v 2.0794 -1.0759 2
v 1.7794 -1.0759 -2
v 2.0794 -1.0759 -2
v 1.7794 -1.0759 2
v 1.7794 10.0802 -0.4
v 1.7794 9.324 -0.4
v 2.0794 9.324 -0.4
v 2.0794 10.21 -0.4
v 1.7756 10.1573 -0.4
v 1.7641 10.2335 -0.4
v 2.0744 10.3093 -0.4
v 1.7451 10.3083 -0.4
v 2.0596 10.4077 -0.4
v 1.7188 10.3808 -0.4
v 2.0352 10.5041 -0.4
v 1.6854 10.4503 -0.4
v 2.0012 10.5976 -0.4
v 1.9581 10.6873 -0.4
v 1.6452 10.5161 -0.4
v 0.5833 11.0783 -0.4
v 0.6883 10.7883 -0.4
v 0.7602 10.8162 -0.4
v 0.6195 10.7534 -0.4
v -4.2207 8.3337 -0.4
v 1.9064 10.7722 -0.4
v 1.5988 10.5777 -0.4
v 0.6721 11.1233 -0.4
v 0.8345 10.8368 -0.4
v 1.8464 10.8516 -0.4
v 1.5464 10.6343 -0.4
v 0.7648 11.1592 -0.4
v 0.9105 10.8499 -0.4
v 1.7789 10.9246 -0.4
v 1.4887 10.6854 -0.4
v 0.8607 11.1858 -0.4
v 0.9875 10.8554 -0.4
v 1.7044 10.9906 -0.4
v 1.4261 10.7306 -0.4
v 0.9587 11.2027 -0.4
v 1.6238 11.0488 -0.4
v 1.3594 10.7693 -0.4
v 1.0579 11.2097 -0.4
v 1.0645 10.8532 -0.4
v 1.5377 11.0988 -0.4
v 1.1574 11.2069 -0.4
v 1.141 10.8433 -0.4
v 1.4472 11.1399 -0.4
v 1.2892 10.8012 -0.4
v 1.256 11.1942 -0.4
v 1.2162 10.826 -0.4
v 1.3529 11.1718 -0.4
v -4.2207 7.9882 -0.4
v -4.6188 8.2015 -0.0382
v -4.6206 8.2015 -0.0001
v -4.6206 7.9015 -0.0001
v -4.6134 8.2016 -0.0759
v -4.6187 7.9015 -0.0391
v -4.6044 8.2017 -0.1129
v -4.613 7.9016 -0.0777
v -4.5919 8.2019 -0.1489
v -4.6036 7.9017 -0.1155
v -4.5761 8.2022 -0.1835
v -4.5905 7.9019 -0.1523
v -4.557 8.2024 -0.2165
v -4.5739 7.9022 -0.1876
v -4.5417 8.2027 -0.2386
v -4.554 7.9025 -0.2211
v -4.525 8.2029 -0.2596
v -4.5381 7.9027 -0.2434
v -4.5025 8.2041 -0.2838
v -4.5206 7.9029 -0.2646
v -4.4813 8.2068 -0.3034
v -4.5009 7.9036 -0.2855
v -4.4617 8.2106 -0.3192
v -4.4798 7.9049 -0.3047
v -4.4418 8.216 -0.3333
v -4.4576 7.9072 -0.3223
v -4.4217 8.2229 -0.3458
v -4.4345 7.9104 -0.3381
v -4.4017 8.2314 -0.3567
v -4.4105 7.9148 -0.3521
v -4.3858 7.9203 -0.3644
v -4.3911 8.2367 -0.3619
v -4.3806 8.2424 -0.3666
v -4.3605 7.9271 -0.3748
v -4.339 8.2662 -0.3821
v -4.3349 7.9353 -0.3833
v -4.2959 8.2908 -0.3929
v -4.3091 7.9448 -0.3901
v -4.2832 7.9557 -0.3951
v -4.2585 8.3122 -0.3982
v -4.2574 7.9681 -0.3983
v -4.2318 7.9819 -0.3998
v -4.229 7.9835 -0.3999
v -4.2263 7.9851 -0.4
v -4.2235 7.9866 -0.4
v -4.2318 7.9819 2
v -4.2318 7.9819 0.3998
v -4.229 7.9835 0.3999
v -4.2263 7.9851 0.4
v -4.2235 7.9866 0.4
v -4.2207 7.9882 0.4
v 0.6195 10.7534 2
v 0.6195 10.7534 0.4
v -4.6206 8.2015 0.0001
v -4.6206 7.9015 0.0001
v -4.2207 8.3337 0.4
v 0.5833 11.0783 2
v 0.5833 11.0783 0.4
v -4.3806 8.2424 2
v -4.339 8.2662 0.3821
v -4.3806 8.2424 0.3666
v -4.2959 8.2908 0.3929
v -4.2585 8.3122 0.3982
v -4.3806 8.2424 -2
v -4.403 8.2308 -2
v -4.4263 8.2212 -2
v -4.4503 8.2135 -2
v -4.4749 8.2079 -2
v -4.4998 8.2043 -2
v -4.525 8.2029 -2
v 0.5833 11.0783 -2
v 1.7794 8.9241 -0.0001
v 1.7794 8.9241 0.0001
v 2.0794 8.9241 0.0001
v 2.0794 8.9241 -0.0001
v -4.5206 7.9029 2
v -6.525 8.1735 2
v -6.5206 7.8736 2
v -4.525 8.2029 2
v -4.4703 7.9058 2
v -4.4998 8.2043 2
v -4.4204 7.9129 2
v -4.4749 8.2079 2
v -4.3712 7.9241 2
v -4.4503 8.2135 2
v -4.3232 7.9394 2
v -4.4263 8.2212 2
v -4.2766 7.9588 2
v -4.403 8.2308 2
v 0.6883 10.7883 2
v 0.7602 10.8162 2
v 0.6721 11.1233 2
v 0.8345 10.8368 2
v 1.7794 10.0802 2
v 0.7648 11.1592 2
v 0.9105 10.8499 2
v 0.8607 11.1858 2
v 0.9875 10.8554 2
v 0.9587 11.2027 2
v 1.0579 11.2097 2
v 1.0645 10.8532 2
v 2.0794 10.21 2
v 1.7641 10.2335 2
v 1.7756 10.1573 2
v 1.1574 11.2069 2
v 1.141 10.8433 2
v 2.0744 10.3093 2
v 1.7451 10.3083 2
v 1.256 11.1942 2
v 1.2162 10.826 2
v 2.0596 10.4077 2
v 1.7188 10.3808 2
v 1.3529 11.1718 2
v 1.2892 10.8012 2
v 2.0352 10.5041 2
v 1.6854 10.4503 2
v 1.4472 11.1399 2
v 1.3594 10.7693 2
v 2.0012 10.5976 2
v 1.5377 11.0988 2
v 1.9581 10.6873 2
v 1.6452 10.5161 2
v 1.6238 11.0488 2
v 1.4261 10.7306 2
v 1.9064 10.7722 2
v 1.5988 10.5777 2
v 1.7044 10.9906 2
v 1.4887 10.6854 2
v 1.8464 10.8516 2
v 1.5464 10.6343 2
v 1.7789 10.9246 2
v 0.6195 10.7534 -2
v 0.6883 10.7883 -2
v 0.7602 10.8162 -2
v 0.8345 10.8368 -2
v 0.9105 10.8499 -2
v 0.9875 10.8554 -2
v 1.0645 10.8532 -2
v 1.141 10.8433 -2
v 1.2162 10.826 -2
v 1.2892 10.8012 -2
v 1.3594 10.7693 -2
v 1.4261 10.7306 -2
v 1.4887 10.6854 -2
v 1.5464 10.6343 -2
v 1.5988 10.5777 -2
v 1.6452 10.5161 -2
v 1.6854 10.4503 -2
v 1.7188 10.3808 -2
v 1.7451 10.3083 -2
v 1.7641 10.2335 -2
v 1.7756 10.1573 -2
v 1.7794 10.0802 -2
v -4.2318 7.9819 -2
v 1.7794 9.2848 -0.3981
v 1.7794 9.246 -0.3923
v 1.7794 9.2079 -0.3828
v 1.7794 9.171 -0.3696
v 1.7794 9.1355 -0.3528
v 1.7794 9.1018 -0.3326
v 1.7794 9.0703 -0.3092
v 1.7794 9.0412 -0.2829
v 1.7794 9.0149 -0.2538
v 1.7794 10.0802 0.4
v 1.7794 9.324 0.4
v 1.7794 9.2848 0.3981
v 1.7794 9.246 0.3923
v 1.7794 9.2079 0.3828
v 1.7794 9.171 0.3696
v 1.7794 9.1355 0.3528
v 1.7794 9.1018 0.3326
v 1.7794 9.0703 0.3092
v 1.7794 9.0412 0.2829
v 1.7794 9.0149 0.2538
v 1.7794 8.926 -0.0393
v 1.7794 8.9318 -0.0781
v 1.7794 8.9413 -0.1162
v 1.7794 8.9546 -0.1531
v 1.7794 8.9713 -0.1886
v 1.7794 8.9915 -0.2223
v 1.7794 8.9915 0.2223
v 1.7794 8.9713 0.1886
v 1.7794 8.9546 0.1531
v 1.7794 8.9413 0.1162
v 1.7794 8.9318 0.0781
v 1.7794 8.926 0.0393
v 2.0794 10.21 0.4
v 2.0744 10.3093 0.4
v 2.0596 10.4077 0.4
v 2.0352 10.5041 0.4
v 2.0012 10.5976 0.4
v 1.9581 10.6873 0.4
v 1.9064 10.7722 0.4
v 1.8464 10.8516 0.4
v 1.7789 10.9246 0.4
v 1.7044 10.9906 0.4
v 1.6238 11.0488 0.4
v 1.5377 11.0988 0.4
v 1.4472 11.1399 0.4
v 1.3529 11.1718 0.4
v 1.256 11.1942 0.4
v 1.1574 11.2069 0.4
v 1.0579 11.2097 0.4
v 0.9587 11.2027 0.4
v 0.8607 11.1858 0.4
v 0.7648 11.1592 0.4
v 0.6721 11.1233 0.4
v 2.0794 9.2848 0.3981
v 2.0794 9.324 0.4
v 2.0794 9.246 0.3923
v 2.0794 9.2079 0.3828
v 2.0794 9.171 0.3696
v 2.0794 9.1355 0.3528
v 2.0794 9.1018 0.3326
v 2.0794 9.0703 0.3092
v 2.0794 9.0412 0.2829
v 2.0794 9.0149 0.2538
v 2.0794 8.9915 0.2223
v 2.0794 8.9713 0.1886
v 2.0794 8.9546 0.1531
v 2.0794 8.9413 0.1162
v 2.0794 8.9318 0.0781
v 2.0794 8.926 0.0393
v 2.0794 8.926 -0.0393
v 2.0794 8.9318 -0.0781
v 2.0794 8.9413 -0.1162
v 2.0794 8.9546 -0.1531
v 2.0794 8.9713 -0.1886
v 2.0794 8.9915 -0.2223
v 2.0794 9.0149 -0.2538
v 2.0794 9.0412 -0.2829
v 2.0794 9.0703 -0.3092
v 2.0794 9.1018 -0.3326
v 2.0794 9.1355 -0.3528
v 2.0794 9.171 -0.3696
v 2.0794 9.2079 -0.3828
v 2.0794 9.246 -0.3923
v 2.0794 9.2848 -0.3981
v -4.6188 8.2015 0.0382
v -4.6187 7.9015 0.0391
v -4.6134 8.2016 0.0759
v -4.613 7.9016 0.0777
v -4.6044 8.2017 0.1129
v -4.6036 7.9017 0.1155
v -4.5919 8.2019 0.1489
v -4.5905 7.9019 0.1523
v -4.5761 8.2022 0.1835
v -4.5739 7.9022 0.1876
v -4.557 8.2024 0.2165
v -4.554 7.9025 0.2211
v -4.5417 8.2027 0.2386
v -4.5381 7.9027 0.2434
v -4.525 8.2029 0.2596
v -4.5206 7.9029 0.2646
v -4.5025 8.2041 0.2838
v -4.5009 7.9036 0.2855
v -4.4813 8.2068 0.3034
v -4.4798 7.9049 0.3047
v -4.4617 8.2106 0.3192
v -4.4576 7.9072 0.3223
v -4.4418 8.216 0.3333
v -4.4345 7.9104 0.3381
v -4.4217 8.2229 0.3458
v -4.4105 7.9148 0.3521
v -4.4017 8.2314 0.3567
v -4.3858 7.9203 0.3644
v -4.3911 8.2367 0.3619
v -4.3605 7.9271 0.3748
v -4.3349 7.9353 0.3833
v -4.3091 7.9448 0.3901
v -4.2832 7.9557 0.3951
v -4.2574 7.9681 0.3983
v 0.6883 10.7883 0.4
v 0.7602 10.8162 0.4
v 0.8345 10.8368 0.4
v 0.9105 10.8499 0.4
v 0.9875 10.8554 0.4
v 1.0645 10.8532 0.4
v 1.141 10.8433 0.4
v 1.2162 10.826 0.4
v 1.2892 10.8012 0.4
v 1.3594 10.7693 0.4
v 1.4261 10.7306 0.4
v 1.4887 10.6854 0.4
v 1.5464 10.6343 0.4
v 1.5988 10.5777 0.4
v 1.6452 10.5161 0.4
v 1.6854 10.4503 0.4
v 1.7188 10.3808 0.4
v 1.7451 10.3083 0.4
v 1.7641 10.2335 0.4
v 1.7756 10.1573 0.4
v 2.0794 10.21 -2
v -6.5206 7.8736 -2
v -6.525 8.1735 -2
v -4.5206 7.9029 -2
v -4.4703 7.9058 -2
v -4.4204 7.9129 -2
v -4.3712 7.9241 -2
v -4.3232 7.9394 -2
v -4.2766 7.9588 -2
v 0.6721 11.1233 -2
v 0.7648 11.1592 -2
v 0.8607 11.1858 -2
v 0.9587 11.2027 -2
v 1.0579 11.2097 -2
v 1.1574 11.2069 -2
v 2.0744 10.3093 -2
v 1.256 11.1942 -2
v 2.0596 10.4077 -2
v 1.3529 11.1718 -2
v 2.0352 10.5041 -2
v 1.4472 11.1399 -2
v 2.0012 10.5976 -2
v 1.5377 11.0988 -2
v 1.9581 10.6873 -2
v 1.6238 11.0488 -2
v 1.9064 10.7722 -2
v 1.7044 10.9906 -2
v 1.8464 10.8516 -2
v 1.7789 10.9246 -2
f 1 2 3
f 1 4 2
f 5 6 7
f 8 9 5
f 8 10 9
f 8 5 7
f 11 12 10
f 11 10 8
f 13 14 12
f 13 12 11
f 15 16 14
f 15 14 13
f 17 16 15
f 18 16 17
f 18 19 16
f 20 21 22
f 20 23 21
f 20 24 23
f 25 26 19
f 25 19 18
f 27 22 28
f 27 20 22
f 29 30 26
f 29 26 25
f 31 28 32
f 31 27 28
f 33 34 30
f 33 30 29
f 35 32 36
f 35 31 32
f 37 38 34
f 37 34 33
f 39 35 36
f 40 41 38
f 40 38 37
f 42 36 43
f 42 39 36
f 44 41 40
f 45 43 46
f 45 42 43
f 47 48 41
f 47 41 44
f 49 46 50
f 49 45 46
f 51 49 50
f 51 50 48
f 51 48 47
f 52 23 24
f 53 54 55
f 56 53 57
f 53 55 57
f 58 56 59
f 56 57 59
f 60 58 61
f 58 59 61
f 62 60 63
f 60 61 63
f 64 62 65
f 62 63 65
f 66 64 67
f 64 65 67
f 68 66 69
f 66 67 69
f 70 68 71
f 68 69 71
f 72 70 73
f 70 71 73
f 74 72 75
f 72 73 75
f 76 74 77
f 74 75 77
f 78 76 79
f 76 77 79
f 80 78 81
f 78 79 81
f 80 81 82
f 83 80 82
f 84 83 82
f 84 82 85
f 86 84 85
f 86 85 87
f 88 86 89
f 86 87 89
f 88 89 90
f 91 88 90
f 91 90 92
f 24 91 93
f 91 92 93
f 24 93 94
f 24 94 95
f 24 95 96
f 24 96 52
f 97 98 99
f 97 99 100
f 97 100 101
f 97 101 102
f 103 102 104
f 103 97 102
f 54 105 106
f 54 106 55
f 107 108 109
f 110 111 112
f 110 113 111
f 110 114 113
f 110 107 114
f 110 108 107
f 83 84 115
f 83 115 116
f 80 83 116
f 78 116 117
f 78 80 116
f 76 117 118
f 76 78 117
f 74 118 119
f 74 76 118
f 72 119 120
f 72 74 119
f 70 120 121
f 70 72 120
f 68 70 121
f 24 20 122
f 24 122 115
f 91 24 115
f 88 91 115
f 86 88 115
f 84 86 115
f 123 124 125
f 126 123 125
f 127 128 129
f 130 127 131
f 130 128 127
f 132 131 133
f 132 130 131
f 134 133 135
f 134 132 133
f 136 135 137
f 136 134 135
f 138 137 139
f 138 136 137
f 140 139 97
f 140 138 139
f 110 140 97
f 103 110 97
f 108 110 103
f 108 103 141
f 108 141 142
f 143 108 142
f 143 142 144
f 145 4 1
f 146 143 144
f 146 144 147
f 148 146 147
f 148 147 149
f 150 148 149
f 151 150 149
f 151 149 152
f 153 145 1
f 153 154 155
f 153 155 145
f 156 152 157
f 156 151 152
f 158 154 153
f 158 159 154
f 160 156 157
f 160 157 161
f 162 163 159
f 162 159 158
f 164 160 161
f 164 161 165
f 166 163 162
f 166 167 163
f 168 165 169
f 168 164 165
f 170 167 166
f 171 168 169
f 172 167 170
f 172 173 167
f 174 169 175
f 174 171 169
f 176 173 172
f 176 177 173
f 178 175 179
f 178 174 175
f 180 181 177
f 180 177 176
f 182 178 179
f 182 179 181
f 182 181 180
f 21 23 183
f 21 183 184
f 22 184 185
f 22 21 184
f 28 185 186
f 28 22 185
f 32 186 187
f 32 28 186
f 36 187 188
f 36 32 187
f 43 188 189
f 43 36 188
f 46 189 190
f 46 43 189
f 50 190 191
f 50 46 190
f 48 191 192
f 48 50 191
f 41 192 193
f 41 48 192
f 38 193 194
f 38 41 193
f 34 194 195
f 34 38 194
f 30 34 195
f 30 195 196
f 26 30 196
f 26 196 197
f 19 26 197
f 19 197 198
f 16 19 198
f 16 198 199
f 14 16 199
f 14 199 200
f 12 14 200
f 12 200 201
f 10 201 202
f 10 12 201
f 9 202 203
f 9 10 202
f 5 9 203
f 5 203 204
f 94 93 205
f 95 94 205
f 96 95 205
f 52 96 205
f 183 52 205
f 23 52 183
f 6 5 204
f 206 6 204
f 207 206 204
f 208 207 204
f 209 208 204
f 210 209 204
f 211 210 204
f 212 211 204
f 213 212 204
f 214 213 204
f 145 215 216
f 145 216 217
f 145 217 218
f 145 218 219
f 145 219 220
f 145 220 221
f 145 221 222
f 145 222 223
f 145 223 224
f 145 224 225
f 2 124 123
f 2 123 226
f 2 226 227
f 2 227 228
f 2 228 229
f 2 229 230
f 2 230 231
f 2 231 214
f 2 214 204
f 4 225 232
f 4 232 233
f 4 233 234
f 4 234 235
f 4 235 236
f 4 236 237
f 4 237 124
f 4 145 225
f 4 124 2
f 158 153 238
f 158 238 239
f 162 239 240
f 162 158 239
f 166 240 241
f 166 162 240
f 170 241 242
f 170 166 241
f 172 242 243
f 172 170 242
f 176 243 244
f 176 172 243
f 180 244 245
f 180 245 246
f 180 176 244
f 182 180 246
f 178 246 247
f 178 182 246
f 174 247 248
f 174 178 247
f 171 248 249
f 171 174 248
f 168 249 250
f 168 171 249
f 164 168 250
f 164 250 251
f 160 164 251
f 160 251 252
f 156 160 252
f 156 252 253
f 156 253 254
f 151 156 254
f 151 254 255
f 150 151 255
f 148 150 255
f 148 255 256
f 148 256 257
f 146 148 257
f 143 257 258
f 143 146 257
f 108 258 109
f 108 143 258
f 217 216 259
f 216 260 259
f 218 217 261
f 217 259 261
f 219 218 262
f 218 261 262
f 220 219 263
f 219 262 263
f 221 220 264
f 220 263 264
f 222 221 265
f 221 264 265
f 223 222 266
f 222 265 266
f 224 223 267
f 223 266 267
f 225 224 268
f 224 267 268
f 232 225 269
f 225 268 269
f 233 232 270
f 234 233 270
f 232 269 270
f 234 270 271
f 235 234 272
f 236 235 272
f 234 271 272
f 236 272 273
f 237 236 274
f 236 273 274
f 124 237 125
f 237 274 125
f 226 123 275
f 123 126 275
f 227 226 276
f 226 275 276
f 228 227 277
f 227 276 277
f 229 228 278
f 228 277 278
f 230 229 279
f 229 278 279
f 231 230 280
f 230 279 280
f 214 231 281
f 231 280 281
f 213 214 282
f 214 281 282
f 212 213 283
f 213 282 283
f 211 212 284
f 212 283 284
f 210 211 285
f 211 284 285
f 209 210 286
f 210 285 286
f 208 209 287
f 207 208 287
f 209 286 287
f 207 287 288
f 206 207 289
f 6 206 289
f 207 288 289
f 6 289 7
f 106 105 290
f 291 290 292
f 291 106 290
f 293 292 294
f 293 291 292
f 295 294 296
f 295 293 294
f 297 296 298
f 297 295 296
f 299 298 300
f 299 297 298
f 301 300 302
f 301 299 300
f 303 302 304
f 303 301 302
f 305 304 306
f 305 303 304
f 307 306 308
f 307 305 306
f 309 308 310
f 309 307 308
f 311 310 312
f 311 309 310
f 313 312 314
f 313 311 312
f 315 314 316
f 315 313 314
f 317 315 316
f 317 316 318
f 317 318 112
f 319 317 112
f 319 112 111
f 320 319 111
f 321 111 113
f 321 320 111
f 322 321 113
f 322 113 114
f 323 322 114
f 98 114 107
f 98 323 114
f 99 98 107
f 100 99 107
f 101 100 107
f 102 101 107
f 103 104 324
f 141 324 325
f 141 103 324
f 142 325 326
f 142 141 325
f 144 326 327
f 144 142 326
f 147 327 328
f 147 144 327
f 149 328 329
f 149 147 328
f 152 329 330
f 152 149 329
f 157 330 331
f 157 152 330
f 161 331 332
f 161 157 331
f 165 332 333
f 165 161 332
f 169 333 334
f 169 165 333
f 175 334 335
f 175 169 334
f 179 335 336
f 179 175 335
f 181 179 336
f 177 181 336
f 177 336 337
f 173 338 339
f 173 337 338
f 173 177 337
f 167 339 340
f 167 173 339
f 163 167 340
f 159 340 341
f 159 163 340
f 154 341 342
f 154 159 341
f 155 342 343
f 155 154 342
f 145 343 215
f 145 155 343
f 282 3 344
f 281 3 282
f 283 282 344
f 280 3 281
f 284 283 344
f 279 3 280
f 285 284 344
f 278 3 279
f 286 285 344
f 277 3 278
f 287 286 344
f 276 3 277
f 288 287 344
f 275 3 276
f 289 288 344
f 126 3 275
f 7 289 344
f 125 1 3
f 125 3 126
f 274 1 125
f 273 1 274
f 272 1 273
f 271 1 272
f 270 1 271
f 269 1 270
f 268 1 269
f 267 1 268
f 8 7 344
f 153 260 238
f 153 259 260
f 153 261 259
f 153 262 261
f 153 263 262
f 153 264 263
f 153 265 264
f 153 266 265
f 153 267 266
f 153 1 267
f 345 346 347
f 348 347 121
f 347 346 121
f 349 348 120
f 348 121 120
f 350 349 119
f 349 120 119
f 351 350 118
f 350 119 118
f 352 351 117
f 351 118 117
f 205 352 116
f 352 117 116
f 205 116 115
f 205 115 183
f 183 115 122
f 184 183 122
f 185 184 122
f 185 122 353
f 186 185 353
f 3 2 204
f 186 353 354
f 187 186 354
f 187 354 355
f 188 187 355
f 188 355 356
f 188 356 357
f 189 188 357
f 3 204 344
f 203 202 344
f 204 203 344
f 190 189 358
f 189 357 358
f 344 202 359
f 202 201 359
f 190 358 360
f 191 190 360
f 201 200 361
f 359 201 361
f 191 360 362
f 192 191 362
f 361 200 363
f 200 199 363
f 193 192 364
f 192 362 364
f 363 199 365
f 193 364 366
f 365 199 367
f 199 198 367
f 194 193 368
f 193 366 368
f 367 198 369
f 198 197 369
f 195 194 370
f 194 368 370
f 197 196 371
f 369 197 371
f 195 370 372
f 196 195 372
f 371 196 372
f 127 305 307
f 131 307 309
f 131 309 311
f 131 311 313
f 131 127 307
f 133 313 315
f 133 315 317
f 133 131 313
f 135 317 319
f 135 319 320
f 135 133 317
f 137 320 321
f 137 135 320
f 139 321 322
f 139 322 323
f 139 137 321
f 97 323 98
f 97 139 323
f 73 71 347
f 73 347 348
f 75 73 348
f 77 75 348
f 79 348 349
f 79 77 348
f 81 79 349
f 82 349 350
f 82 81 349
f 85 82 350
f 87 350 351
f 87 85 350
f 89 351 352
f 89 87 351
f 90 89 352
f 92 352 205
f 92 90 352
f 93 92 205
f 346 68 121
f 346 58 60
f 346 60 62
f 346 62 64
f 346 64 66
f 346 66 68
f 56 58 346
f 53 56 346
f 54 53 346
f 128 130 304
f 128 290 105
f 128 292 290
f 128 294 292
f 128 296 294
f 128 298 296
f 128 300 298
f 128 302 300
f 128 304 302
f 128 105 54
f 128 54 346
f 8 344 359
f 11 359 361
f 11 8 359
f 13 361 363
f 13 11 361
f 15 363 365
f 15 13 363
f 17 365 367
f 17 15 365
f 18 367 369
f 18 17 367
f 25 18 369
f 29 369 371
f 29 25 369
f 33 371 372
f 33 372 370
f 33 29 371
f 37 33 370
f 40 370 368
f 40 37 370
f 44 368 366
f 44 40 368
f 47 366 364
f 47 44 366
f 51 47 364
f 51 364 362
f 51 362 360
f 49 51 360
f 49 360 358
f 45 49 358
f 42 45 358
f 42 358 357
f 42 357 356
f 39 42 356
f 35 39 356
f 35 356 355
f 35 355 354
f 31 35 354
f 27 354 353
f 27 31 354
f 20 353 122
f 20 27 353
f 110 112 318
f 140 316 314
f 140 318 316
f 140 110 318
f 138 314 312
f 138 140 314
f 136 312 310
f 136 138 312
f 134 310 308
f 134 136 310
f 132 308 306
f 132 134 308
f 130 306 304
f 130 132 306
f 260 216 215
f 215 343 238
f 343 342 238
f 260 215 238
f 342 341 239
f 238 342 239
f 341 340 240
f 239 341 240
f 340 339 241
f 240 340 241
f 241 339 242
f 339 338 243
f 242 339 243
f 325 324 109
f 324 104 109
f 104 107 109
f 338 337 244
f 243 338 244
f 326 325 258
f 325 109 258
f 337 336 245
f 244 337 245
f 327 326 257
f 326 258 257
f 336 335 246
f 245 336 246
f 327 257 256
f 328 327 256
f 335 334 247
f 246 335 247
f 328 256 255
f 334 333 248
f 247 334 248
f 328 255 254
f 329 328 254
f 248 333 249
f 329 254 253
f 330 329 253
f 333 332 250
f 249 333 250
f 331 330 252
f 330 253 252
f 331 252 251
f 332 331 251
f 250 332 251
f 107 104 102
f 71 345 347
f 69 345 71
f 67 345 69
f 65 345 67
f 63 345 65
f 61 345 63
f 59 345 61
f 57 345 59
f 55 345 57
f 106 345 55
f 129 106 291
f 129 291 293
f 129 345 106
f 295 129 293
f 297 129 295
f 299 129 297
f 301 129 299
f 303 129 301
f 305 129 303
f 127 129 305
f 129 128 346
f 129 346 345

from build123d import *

# Parameters (mm, degrees)
BOSS_EXTRUDE1_DEPTH              = 2
CUT_EXTRUDE2_REACH               = 30.124
CUT_EXTRUDE2_START               = 15
SKETCH3_W                        = 6.7
SKETCH3_H                        = 0.8
CUT_EXTRUDE3_REACH               = 23.248
CUT_EXTRUDE3_OFFSET_FROM_SURFACE = 10
SKETCH4_W                        = 2.662765864
SKETCH4_H                        = 0.8
FILLET1_R                        = 0.4


with BuildPart() as part:
    # Sketch1 → Boss-Extrude1 (new, symmetric)
    with BuildSketch(Plane.XY):
        with BuildLine():
            Line((1.77938838, -1.075884724), (2.07938838, -1.075884724))
            Line((2.07938838, -1.075884724), (2.07938838, 10.209972433))
            ThreePointArc((2.07938838, 10.209972433), (1.58135883, 11.074857205), (0.583337044, 11.078265628))
            Line((0.583337044, 11.078265628), (-4.380611082, 8.242388166))
            ThreePointArc((-4.380611082, 8.242388166), (-4.45031283, 8.2134957), (-4.525019051, 8.202908502))
            Line((-4.525019051, 8.202908502), (-6.525019051, 8.173522453))
            Line((-6.525019051, 8.173522453), (-6.52061162, 7.873554831))
            Line((-6.52061162, 7.873554831), (-4.52061162, 7.902940879))
            ThreePointArc((-4.52061162, 7.902940879), (-4.371199177, 7.924115276), (-4.231795681, 7.981900208))
            Line((-4.231795681, 7.981900208), (0.619506411, 10.753423582))
            ThreePointArc((0.619506411, 10.753423582), (1.393268277, 10.750781047), (1.77938838, 10.080239717))
            Line((1.77938838, 10.080239717), (1.77938838, -1.075884724))
        make_face()
    extrude(amount=BOSS_EXTRUDE1_DEPTH, both=True)

    # Cut-Extrude2: up to this plane
    cut_extrude2_end = Plane(origin=(0.619506411, 10.753423582, 2), z_dir=(-0.49605133620388303, 0.8682931946355115, 0))
    # Sketch3 → Cut-Extrude2 (cut, up to the surface)
    with BuildSketch(Plane(origin=(0, 0, 0), x_dir=(1, 0, 0), z_dir=(0, 1, 0)).offset(CUT_EXTRUDE2_START), mode=Mode.PRIVATE) as cut_extrude2_sk1:
        with Locations((-1.27061162, 0)):
            Rectangle(SKETCH3_W, SKETCH3_H)
    cut_extrude2_tool1 = split(extrude(cut_extrude2_sk1.sketch, amount=-CUT_EXTRUDE2_REACH, mode=Mode.PRIVATE), bisect_by=cut_extrude2_end, keep=Keep.BOTH, mode=Mode.PRIVATE)
    add(cut_extrude2_tool1.solids().sort_by_distance((-1.270612, 15, 0))[0], mode=Mode.SUBTRACT)

    # Cut-Extrude3: up to this face of the body (flat: up to its plane, moved by the offset)
    cut_extrude3_end = Plane(part.part.faces().sort_by_distance((1.92938838, -1.075884724, 0))[0]).offset(-CUT_EXTRUDE3_OFFSET_FROM_SURFACE)
    # Sketch4 → Cut-Extrude3 (cut, up to the picked face)
    with BuildSketch(Plane(origin=(-4.479253053, 7.840529112, 0), x_dir=(0.8682931946355115, 0.49605133620388303, 0), z_dir=(-0.49605133620388303, 0.8682931946355115, 0)), mode=Mode.PRIVATE) as cut_extrude3_sk1:
        with Locations((7.203546269, 0)):
            Rectangle(SKETCH4_W, SKETCH4_H)
    cut_extrude3_tool1 = split(extrude(cut_extrude3_sk1.sketch, amount=-CUT_EXTRUDE3_REACH, mode=Mode.PRIVATE), bisect_by=cut_extrude3_end, keep=Keep.BOTH, mode=Mode.PRIVATE)
    add(cut_extrude3_tool1.solids().sort_by(Axis((1.775537, 11.413858, 0), (0.49605133620388303, -0.8682931946355115, 0)))[0], mode=Mode.SUBTRACT)

    # Fillet1
    fillet1_edges = [part.edges().sort_by_distance(p)[0] for p in [
        (-4.62061162, 8.051487767, -0.4),
        (-4.62061162, 8.051487767, 0.4),
        (1.92938838, 8.924115276, -0.4),
        (1.92938838, 8.924115276, 0.4),
    ]]
    fillet(fillet1_edges, radius=FILLET1_R - 0.0001)  # a hair under: the kernel refuses the full size


solid = part.part
